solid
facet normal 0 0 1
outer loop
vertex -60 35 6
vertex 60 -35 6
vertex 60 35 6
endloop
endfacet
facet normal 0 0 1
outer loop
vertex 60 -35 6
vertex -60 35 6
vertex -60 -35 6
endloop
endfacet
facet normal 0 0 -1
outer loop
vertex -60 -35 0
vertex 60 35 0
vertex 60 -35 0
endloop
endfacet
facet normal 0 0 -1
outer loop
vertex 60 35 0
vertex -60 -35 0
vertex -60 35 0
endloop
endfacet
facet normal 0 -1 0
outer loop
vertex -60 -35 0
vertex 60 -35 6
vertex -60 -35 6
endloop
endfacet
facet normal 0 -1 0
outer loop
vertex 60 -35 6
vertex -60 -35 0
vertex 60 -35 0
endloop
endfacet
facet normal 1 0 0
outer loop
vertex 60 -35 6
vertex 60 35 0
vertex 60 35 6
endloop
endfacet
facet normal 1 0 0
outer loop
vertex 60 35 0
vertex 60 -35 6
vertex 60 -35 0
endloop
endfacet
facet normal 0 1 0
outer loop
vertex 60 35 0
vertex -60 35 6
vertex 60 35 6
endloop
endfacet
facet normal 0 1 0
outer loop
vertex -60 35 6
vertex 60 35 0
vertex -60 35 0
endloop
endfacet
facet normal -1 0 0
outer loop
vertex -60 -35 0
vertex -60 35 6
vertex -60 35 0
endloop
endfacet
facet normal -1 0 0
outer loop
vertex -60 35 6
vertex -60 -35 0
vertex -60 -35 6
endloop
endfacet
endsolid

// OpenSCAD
// file: ../components/mounting-plate/mounting_plate.scad
MOUNTING_PLATE_WIDTH = 120;
MOUNTING_PLATE_HEIGHT = 70;
MOUNTING_PLATE_THICKNESS = 6;

module mounting_plate(
    width = MOUNTING_PLATE_WIDTH,
    height = MOUNTING_PLATE_HEIGHT,
    thickness = MOUNTING_PLATE_THICKNESS
) {
    translate([-width / 2, -height / 2, 0])
        cube([width, height, thickness]);
}

module mounting_plate_design(view = "final") {
    if (view == "base")
        color([1, 0, 0, 0.55]) mounting_plate();
    else
        mounting_plate();
}
// main file
use <../components/mounting-plate/mounting_plate.scad>
$fn = 120;
mounting_plate();
